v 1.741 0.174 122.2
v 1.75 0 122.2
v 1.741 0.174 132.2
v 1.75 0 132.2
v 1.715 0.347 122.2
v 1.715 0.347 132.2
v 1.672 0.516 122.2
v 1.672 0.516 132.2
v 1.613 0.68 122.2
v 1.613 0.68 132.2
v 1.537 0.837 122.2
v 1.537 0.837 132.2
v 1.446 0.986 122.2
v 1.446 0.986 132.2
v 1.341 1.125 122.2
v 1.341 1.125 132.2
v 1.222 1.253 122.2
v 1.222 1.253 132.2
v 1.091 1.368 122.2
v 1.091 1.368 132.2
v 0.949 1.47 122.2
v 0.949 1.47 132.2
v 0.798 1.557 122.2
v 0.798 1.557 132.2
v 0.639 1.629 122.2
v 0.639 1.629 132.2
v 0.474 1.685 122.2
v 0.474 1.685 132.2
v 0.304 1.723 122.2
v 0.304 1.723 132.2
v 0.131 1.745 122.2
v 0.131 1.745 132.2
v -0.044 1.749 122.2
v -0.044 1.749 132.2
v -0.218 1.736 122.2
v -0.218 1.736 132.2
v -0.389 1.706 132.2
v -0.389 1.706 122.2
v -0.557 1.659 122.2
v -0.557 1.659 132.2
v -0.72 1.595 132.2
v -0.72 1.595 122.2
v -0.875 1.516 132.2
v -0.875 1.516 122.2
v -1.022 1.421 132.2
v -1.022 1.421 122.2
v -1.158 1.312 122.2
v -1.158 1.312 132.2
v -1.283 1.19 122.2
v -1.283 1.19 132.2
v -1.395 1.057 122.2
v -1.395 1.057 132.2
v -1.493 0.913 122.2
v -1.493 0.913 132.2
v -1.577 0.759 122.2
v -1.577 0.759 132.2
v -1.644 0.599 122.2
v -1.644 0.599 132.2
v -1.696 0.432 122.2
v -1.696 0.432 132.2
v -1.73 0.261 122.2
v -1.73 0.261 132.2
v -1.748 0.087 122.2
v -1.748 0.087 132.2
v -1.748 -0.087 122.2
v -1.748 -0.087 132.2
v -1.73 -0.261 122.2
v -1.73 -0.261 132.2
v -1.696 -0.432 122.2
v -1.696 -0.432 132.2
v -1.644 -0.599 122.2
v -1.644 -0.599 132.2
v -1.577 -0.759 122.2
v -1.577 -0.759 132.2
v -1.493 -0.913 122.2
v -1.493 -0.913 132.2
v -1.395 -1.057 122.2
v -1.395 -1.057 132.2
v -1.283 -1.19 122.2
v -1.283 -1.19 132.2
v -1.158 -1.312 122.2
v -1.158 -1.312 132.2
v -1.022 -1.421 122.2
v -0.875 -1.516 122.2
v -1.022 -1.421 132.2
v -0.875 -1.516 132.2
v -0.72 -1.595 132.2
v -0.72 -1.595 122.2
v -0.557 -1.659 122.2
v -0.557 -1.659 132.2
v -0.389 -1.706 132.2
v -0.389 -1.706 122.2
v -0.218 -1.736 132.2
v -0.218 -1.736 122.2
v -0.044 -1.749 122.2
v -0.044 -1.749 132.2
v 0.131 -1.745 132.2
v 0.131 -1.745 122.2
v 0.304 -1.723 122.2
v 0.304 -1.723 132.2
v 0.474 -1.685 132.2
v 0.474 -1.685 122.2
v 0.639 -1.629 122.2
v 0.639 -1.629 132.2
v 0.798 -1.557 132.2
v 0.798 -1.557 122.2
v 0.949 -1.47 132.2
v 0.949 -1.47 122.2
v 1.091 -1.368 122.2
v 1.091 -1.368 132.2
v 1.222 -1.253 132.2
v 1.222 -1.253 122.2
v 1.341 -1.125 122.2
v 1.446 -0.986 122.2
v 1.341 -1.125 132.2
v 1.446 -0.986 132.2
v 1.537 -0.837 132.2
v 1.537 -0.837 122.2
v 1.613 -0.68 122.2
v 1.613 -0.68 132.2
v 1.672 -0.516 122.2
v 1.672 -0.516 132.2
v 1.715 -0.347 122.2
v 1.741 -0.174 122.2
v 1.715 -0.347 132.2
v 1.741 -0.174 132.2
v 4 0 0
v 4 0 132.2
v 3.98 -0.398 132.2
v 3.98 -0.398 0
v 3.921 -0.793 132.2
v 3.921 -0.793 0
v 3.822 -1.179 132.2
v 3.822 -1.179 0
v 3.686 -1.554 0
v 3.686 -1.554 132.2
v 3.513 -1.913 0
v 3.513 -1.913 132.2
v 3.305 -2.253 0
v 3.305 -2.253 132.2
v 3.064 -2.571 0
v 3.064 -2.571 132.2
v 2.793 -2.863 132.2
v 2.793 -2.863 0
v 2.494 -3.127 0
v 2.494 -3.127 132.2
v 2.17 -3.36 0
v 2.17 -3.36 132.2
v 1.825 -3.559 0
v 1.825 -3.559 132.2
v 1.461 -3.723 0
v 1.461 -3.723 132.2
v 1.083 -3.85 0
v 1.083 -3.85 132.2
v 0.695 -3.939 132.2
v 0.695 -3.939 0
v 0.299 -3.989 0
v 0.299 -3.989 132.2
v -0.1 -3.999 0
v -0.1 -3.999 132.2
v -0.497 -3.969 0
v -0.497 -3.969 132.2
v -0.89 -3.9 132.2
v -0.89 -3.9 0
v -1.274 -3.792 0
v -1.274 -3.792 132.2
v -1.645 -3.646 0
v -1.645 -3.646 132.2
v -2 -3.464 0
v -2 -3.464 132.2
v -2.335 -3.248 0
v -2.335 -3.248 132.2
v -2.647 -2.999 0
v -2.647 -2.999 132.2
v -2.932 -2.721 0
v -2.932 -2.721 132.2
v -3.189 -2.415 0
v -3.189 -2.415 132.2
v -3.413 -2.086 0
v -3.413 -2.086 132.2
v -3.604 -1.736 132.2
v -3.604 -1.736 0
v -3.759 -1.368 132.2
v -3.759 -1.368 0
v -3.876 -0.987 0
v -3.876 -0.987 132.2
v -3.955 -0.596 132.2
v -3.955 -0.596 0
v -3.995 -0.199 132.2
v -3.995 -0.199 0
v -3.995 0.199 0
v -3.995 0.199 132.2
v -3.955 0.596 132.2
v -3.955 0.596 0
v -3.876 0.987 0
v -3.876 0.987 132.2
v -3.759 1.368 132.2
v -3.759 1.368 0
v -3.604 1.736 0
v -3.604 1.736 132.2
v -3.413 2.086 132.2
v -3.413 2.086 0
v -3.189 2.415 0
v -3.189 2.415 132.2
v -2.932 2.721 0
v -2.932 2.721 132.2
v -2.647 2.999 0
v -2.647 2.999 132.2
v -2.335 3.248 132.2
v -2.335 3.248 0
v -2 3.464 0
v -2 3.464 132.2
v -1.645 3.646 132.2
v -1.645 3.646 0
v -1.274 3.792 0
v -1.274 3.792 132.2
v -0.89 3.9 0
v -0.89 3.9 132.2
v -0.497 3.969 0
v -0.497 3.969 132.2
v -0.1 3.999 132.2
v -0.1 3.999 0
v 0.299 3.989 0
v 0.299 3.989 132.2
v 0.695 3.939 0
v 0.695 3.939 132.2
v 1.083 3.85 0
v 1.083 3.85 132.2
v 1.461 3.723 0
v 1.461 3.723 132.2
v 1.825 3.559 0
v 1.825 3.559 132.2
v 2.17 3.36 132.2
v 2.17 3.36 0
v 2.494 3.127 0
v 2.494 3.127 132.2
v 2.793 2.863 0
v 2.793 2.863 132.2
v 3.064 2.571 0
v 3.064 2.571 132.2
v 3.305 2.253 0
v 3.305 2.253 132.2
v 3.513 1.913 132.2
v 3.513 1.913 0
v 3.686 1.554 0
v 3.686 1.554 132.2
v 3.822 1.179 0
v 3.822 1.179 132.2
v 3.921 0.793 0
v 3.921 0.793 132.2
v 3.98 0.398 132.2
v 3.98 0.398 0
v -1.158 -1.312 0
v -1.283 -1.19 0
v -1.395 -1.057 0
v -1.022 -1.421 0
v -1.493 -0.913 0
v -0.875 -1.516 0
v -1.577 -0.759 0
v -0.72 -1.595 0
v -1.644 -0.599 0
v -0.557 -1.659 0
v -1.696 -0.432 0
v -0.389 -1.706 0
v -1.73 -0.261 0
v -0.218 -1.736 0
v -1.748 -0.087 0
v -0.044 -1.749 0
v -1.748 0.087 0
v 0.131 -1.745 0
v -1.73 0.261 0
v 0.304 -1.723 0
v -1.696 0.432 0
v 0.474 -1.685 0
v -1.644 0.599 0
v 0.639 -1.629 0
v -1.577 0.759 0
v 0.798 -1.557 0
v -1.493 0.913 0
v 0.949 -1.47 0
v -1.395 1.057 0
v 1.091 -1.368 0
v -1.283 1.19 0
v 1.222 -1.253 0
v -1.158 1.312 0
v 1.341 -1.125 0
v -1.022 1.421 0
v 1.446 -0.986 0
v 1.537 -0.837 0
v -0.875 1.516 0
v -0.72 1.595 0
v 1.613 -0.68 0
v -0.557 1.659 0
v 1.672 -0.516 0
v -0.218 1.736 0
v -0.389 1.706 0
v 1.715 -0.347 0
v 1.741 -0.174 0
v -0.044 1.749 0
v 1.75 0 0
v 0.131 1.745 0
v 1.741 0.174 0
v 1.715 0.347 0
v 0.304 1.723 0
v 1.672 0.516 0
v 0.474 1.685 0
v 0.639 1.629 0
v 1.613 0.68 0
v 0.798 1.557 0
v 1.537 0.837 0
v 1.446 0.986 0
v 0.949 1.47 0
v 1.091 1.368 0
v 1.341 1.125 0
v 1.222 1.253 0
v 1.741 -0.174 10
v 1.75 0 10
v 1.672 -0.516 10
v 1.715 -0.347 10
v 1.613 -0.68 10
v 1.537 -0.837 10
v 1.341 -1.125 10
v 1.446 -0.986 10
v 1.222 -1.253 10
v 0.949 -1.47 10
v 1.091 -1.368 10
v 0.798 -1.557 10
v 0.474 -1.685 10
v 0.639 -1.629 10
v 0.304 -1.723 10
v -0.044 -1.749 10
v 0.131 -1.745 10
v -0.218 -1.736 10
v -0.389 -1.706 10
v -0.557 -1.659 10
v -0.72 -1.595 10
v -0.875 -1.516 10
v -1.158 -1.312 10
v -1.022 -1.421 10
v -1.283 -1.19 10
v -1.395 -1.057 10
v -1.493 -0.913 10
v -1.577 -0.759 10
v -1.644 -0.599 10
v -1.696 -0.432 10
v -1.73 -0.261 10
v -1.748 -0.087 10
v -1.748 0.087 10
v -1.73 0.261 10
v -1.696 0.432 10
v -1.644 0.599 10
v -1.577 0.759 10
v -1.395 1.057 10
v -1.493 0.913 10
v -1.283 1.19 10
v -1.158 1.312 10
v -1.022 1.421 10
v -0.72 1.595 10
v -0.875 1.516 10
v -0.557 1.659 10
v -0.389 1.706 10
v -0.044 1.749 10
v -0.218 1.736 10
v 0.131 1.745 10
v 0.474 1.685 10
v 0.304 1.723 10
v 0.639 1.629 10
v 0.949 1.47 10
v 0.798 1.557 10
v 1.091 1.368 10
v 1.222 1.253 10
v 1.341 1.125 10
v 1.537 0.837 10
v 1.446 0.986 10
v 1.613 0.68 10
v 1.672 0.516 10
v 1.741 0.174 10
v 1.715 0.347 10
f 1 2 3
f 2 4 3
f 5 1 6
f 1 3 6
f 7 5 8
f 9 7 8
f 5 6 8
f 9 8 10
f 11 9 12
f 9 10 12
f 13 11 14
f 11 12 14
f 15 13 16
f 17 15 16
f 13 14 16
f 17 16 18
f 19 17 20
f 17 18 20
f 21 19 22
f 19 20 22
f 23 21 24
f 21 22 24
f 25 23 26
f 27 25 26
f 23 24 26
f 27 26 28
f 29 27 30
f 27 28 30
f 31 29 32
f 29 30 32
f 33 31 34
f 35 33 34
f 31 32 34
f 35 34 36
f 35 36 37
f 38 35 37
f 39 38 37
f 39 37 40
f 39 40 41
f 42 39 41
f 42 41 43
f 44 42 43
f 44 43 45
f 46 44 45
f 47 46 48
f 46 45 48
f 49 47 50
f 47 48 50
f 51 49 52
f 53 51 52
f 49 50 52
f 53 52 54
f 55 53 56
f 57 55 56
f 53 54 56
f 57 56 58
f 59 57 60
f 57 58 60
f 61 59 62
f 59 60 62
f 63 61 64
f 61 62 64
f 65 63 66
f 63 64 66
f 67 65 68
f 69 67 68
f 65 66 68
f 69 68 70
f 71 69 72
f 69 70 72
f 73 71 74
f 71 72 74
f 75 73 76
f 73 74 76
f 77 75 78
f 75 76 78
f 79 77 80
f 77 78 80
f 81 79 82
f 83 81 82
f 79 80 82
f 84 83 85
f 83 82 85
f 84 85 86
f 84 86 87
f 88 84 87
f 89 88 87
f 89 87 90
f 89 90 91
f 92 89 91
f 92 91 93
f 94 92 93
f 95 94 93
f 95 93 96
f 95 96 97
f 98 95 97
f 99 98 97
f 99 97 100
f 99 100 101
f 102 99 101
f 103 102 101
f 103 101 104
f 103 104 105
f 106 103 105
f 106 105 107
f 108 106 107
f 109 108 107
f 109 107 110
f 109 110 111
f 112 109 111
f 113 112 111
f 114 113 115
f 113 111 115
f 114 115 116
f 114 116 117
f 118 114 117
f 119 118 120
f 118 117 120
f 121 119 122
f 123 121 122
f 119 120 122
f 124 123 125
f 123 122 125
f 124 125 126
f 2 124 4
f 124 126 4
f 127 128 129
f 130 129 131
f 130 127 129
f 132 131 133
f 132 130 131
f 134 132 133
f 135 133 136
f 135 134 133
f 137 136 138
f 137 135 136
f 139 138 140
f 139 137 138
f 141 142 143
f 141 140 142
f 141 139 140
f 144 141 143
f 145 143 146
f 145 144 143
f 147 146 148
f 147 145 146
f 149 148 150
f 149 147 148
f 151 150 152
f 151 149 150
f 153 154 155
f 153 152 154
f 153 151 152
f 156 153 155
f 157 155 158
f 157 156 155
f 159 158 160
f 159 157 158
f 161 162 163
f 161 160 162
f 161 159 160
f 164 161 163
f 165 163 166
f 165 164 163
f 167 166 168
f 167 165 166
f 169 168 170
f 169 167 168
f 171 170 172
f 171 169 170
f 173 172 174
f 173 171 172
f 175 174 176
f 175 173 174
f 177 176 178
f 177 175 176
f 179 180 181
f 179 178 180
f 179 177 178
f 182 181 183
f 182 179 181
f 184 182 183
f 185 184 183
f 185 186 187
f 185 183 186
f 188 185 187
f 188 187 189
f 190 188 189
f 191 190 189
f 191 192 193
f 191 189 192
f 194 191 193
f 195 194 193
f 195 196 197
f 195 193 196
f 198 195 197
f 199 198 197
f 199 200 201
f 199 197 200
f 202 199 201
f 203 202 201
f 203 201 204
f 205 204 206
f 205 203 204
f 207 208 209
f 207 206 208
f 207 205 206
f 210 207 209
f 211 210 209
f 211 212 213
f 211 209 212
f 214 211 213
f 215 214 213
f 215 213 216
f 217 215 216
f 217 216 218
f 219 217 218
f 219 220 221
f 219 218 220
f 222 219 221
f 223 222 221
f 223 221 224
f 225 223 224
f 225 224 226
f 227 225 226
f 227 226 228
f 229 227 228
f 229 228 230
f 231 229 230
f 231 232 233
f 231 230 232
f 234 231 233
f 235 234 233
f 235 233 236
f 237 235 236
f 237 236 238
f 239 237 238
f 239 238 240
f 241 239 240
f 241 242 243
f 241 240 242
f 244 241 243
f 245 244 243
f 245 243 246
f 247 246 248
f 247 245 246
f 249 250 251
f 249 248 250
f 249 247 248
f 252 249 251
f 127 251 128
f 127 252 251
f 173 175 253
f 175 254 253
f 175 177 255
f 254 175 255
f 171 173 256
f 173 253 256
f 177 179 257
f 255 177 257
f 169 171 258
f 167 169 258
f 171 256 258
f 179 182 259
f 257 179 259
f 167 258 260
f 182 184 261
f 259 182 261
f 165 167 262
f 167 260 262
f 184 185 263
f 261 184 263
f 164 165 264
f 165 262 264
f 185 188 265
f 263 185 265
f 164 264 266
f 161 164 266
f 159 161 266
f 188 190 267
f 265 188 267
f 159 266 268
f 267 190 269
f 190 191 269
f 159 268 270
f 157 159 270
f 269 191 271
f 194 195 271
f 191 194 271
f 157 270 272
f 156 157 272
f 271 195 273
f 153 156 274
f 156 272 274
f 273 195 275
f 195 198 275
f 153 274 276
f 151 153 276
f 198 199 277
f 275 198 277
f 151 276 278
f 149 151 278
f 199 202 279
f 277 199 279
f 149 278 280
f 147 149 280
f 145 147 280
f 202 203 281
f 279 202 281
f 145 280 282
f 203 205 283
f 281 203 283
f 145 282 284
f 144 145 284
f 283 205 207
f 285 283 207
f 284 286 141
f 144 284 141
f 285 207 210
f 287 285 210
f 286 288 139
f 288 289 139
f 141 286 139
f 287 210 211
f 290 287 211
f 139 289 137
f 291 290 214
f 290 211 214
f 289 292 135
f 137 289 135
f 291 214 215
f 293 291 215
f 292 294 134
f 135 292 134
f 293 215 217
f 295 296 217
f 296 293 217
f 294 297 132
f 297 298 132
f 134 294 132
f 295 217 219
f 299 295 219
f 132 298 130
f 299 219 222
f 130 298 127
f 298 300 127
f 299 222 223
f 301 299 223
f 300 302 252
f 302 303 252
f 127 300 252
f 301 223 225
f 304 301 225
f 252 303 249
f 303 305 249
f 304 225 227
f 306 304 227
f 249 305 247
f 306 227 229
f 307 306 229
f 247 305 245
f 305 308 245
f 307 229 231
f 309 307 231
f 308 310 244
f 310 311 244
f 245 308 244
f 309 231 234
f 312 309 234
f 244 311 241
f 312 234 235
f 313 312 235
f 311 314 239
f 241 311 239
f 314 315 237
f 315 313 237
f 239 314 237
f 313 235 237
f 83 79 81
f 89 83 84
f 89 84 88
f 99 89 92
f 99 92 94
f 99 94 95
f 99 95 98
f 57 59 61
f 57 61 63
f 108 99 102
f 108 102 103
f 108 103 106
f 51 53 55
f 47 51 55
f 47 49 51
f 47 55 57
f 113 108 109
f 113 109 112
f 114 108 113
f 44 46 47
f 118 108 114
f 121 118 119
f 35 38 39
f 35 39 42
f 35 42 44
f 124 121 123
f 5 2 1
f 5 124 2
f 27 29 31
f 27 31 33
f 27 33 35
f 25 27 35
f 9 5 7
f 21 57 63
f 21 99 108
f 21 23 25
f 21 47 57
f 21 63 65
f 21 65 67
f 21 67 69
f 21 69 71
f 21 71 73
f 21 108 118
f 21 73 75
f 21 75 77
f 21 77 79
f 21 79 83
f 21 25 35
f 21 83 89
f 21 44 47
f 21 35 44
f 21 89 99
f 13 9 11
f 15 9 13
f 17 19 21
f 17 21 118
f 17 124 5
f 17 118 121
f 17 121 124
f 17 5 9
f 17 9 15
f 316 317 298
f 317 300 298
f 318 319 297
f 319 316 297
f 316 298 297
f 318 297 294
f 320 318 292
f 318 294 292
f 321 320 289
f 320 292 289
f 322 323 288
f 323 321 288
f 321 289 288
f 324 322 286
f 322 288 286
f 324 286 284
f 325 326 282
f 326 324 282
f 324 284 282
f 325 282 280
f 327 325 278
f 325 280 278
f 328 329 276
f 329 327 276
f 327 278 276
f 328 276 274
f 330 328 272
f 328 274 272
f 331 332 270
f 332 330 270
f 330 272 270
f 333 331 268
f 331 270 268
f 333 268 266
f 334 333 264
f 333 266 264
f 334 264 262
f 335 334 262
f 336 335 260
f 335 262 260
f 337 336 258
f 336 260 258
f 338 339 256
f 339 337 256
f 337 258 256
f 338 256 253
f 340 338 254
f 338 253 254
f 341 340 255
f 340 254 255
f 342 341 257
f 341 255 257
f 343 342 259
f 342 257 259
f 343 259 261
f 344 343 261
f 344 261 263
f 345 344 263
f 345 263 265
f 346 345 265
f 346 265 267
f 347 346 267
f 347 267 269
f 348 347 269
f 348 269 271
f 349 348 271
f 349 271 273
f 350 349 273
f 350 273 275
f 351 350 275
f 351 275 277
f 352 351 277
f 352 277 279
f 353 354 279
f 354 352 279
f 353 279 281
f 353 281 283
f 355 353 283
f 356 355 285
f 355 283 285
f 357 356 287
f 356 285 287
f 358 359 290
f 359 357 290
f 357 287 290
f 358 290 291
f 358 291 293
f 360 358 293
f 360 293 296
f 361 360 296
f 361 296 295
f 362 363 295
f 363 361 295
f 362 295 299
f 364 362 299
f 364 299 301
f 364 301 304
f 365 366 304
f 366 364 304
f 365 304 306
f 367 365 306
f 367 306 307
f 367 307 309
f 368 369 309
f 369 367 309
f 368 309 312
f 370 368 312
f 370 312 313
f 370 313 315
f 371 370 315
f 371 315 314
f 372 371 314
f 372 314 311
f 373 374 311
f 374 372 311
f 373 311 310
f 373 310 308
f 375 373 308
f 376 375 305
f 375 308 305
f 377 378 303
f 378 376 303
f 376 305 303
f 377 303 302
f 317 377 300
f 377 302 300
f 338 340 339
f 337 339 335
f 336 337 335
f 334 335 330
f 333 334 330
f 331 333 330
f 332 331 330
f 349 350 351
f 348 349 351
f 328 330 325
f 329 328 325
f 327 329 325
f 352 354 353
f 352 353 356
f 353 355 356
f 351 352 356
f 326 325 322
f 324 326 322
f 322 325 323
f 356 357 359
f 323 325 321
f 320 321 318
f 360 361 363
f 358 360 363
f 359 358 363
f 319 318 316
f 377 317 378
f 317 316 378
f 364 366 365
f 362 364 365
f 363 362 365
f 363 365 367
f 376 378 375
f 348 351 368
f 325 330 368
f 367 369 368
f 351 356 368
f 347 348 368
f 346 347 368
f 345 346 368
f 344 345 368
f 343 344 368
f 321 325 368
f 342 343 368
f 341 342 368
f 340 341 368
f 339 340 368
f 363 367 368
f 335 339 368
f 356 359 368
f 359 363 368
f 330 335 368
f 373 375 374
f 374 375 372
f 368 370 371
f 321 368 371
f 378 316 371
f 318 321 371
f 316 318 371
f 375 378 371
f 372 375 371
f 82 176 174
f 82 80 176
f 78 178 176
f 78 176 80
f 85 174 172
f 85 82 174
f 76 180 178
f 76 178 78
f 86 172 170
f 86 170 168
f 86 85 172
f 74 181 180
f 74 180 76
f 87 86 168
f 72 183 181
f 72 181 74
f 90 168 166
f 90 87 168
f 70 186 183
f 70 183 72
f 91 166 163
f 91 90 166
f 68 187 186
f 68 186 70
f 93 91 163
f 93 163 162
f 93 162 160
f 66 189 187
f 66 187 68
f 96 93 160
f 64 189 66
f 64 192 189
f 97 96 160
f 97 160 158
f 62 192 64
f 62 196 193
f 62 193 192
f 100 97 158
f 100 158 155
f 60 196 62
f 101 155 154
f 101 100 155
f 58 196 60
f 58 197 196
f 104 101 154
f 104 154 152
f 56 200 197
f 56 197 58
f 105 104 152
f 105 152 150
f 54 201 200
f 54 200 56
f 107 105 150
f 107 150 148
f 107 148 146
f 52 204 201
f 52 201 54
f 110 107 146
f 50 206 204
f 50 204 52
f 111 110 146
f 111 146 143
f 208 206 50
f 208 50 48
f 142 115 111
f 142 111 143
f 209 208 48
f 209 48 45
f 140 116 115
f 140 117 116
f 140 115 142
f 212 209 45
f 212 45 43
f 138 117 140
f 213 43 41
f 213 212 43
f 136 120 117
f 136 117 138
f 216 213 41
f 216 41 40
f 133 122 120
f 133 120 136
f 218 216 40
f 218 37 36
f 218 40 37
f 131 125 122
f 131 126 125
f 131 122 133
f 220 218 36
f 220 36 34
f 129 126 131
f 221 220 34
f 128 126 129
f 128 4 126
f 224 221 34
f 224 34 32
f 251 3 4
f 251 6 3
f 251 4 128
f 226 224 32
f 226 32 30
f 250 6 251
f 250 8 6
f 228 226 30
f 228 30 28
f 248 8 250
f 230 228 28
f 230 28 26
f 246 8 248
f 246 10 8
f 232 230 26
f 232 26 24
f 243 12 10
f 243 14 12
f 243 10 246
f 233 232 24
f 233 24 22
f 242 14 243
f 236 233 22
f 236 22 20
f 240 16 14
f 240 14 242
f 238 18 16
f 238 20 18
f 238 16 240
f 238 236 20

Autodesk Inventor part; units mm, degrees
ref_plane "YZ Plane" through (0, 0, 0) normal (1, 0, 0) x (0, 1, 0)
ref_plane "XZ Plane" through (0, 0, 0) normal (0, 1, 0) x (-1, 0, 0)
ref_plane "XY Plane" through (0, 0, 0) normal (0, 0, 1) x (1, 0, 0)
sketch "スケッチ1" plane through (0, 0, 0) normal (0, 0, 1) x (1, 0, 0)
  circle A0 centre (0, 0) radius 4
  circle A1 centre (0, 0) radius 1.75
  dimension "d0" = 8
  dimension "d1" = 3.5
extrude "押し出し1" add sketch "スケッチ1" along normal blind 132.2 contours A0 | A1
extrude "押し出し2" cut sketch "スケッチ1" along normal blind 10 contours A1
sketch "スケッチ2" plane through (0, 0, 132.2) normal (0, 0, 1) x (1, 0, 0)
  circle A0 centre (0, 0) radius 1.75
  dimension "d6" = 3.5
extrude "押し出し3" cut sketch "スケッチ2" against normal blind 10
equation "\"d6\" = d1"
properties part number "棒" material "アルミニウム 2014-T4"
